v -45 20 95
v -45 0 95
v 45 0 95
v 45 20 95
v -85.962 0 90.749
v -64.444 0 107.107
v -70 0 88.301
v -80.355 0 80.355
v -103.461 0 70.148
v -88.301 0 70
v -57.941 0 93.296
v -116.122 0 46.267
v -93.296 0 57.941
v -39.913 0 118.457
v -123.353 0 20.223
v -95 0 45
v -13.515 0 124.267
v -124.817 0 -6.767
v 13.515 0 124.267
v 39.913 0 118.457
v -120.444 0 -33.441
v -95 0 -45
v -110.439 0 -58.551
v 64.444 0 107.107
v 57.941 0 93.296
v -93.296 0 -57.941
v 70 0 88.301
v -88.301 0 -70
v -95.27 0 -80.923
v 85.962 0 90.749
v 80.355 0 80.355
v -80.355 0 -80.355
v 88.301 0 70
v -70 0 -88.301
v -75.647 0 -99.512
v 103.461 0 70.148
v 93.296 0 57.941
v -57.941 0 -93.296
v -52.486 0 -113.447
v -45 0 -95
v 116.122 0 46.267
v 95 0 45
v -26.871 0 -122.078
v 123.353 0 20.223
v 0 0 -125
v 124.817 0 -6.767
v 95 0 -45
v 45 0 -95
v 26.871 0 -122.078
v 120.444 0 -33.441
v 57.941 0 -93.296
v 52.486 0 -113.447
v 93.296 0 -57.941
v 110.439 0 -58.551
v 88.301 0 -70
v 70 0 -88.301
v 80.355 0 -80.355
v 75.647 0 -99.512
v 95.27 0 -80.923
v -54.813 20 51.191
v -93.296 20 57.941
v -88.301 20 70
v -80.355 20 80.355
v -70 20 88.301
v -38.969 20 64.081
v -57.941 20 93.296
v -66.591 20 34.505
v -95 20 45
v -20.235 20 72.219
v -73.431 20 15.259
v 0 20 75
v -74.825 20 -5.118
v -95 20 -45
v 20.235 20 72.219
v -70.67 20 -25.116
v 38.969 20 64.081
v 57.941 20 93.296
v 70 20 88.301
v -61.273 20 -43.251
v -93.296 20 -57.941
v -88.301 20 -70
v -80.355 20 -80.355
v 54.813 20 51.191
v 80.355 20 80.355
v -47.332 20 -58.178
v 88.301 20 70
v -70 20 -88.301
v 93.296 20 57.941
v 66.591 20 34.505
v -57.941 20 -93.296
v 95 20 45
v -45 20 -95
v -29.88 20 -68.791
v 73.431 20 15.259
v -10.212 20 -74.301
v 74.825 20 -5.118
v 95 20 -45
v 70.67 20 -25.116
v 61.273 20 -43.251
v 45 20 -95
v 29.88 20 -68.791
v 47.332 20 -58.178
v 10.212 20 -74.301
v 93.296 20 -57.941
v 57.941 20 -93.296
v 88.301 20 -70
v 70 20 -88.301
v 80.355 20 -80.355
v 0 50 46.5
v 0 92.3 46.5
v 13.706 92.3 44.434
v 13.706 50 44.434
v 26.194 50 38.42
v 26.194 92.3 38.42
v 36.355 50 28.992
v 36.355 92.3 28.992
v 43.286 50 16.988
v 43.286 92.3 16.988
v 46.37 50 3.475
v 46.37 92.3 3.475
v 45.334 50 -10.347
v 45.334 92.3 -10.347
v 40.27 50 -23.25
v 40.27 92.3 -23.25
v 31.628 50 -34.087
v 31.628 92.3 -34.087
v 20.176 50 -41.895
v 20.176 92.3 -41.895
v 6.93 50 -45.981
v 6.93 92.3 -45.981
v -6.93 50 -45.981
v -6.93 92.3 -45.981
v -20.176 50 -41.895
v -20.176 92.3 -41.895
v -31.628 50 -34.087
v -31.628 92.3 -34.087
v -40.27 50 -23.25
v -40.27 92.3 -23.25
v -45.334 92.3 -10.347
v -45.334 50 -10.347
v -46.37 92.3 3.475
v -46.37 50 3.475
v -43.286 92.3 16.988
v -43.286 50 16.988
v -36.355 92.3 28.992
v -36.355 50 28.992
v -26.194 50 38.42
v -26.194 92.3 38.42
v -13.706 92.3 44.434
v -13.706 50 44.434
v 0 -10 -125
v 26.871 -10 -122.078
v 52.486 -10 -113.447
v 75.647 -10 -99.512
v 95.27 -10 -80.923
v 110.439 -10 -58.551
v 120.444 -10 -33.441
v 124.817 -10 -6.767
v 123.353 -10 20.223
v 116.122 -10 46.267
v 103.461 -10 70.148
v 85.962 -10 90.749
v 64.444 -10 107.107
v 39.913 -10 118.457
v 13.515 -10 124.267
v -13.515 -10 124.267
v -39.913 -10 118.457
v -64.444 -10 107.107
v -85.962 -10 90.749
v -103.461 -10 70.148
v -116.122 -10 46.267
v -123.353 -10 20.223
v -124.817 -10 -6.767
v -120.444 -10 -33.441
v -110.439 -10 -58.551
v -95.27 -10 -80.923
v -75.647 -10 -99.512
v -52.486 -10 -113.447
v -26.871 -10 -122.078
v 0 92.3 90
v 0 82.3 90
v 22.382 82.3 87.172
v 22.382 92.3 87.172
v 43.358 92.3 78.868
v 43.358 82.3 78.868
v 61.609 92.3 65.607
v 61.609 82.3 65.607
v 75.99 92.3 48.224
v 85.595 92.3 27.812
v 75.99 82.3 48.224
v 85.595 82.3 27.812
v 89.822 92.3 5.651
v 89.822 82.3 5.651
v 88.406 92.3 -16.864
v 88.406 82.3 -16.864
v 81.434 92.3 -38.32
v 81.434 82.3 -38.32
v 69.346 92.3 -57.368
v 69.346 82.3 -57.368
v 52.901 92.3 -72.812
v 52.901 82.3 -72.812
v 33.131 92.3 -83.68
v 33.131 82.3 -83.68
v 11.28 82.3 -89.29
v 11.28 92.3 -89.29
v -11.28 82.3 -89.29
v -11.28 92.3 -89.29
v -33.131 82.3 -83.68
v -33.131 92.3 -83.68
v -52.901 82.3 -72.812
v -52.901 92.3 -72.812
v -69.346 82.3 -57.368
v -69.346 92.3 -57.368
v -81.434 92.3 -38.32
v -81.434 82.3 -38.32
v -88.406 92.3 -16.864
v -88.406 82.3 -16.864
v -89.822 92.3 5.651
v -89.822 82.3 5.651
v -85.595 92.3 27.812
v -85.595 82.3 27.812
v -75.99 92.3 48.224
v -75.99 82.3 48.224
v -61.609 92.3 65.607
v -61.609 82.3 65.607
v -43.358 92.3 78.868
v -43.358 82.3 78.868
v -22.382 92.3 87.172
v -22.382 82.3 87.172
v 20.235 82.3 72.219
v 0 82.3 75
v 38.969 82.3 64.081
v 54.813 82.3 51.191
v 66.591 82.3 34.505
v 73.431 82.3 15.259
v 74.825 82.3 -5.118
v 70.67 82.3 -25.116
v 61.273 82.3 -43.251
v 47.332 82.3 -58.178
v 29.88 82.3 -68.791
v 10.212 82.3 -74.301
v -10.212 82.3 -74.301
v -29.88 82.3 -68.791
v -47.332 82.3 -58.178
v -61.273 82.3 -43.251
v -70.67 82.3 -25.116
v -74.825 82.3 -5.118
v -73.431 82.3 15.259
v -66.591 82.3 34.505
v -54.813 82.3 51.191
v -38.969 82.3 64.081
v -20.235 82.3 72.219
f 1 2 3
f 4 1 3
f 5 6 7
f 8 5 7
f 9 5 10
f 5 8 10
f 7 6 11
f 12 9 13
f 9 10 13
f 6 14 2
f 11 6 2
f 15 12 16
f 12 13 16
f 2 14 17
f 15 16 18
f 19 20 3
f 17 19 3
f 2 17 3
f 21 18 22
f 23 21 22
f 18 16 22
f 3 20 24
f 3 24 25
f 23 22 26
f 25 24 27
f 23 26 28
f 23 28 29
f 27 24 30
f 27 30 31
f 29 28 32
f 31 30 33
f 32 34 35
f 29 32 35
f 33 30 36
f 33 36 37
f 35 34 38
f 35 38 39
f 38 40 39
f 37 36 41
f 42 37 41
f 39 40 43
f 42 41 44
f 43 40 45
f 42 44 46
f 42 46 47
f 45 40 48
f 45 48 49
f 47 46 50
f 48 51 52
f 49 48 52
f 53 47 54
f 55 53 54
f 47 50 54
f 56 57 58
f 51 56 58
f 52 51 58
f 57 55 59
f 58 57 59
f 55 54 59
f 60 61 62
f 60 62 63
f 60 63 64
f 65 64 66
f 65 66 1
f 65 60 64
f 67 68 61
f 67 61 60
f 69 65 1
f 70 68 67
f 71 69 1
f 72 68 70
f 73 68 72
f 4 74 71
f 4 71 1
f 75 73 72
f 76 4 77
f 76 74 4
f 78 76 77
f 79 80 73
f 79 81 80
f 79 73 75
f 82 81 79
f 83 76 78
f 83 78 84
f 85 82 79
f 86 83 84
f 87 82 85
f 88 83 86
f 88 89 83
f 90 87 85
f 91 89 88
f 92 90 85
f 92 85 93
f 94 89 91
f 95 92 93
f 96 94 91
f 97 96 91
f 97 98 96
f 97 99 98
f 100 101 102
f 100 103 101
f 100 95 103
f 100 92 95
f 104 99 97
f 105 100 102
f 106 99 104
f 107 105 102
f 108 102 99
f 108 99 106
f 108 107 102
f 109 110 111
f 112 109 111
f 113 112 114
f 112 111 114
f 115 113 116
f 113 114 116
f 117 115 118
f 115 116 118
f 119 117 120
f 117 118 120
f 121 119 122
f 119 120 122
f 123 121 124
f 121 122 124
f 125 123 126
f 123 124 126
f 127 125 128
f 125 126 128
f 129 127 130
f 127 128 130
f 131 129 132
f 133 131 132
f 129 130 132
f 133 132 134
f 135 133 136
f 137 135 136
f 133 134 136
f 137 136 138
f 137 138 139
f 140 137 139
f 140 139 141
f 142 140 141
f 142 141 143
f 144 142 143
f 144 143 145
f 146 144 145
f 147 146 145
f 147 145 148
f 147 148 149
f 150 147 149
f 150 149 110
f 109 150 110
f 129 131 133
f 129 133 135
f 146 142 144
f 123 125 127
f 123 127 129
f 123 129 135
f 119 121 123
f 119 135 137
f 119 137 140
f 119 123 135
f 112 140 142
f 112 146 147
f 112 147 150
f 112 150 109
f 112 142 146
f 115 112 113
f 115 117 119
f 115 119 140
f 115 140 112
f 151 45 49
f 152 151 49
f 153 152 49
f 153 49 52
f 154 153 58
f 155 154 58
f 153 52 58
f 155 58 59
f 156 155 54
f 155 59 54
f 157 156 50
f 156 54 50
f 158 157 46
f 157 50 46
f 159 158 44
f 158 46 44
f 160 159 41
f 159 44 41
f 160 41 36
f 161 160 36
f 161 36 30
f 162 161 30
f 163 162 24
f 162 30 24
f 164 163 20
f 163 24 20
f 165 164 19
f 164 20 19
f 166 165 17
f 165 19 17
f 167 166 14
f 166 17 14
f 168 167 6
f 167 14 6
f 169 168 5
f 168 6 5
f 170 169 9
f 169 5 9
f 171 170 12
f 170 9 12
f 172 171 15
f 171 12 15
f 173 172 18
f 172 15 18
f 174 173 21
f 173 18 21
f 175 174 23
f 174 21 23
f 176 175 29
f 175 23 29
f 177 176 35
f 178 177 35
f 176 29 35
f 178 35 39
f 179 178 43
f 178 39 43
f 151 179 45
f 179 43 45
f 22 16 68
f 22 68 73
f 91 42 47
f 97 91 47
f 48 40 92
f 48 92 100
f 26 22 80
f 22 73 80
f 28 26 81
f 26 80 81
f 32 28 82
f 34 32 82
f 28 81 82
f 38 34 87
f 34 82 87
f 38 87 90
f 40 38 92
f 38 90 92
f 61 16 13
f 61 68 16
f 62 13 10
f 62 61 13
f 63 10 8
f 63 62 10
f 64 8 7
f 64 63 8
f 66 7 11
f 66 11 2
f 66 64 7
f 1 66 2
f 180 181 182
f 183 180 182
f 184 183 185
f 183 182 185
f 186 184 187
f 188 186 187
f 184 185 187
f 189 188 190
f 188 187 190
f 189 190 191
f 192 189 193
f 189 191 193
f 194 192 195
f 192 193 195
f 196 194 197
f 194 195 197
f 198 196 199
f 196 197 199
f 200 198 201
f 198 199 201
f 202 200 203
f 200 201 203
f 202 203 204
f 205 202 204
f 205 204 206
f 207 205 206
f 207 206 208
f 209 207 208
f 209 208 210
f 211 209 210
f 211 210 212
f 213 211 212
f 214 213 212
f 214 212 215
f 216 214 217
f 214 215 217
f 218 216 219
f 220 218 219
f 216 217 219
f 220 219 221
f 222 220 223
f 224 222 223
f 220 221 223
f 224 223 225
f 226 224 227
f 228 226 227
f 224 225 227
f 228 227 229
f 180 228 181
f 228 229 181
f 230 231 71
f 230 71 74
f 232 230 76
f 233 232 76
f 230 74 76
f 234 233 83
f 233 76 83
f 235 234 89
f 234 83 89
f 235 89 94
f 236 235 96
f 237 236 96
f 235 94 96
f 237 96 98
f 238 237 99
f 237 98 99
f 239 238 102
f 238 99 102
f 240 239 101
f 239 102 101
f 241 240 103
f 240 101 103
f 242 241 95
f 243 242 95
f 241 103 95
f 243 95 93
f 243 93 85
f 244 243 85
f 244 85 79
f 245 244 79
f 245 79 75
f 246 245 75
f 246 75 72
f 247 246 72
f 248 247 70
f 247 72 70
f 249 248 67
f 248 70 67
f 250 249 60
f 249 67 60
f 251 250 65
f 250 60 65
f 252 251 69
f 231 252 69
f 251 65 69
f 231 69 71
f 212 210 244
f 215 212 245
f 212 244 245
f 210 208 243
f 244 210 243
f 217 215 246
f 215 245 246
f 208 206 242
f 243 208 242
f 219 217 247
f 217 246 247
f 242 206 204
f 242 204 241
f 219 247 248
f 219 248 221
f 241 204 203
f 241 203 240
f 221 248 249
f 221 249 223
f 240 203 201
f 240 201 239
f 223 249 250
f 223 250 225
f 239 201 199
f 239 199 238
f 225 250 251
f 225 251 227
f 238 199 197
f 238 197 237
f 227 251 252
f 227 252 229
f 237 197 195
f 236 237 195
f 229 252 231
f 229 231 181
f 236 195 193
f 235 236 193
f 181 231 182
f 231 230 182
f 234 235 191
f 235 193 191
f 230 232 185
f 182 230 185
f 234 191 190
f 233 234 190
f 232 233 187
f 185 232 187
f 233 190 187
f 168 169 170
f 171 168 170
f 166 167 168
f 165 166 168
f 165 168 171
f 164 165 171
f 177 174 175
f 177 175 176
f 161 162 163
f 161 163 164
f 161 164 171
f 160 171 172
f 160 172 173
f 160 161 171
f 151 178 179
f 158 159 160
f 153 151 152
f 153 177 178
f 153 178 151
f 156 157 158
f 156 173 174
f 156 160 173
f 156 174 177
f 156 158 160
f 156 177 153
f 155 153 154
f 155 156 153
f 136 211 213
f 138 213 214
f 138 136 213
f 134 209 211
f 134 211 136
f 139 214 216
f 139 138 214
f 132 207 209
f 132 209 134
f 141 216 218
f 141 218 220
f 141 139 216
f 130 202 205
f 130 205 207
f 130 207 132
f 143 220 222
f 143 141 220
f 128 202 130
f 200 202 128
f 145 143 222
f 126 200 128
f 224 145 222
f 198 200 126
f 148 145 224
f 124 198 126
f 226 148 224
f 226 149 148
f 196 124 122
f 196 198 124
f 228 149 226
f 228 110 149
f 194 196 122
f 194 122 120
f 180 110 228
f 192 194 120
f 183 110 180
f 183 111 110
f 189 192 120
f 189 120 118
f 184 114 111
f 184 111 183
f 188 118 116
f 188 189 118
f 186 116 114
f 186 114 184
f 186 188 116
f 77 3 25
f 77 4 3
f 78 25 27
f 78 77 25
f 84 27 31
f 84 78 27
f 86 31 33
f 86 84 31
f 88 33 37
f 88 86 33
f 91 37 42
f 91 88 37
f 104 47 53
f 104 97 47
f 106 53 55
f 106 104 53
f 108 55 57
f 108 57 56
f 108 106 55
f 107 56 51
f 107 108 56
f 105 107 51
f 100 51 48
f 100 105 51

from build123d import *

# Parameters (mm, degrees)
SKETCH_3_W          = 190
SKETCH_3_H          = 190
EXTRUDE_3_DEPTH     = 20
FILLET_2_R          = 50
SKETCH_4_R          = 75
EXTRUDE_4_DEPTH     = 42.3
SKETCH_5_R          = 75
EXTRUDE_5_DEPTH     = 20
SKETCH_14_R         = 90
EXTRUDE_7_DEPTH     = 10
SKETCH_15_R         = 46.5
CUT_EXTRUDE_9_DEPTH = 42.3
SKETCH_12_R         = 54
EXTRUDE_6_DEPTH     = 10
SKETCH_13_R         = 46.5
CUT_EXTRUDE_7_DEPTH = 41.3
SKETCH_18_R         = 125
EXTRUDE_8_DEPTH     = 10


with BuildPart() as part:
    # 草图3 → 凸台-拉伸3 (new body)
    with BuildSketch(Plane(origin=(0, 0, 0), x_dir=(1, 0, 0), z_dir=(0, 1, 0))):
        Rectangle(SKETCH_3_W, SKETCH_3_H)
    extrude(amount=EXTRUDE_3_DEPTH)

    # 圆角2
    fillet_2_edges = [part.edges().sort_by_distance(p)[0] for p in [
        (95, 10, 95),
        (-95, 10, 95),
        (-95, 10, -95),
        (95, 10, -95),
    ]]
    fillet(fillet_2_edges, radius=FILLET_2_R)

    # 草图4 → 凸台-拉伸4 (add)
    with BuildSketch(Plane(origin=(0, 20, 0), x_dir=(1, 0, 0), z_dir=(0, 1, 0))):
        with Locations(Location((0, 0, 0), (0, 0, 270))):
            Circle(SKETCH_4_R)
    extrude(amount=EXTRUDE_4_DEPTH)

    # 草图5 → 凸台-拉伸5 (add)
    with BuildSketch(Plane(origin=(0, 62.3, 0), x_dir=(1, 0, 0), z_dir=(0, 1, 0))):
        with Locations(Location((0, 0, 0), (0, 0, 270))):
            Circle(SKETCH_5_R)
    extrude(amount=EXTRUDE_5_DEPTH)

    # 草图14 → 凸台-拉伸7 (add)
    with BuildSketch(Plane(origin=(0, 82.3, 0), x_dir=(1, 0, 0), z_dir=(0, 1, 0))):
        with Locations(Location((0, 0, 0), (0, 0, 270))):
            Circle(SKETCH_14_R)
    extrude(amount=EXTRUDE_7_DEPTH)

    # 草图15 → 切除-拉伸9 (cut)
    with BuildSketch(Plane(origin=(0, 92.3, 0), x_dir=(1, 0, 0), z_dir=(0, 1, 0))):
        with Locations(Location((0, 0, 0), (0, 0, 270))):
            Circle(SKETCH_15_R)
    extrude(amount=-CUT_EXTRUDE_9_DEPTH, mode=Mode.SUBTRACT)

    # 草图12 → 凸台-拉伸6 (add)
    with BuildSketch(Plane(origin=(0, 82.3, 0), x_dir=(1, 0, 0), z_dir=(0, 1, 0))):
        Circle(SKETCH_12_R)
    extrude(amount=EXTRUDE_6_DEPTH)

    # 草图13 → 切除-拉伸7 (cut)
    with BuildSketch(Plane(origin=(0, 92.3, 0), x_dir=(1, 0, 0), z_dir=(0, 1, 0))):
        with Locations(Location((0, 0, 0), (0, 0, 270))):
            Circle(SKETCH_13_R)
    extrude(amount=-CUT_EXTRUDE_7_DEPTH, mode=Mode.SUBTRACT)

    # 草图18 → 凸台-拉伸8 (add)
    with BuildSketch(Plane.XZ):
        with Locations(Location((0, 0, 0), (0, 0, 270))):
            Circle(SKETCH_18_R)
    extrude(amount=EXTRUDE_8_DEPTH)


solid = part.part
